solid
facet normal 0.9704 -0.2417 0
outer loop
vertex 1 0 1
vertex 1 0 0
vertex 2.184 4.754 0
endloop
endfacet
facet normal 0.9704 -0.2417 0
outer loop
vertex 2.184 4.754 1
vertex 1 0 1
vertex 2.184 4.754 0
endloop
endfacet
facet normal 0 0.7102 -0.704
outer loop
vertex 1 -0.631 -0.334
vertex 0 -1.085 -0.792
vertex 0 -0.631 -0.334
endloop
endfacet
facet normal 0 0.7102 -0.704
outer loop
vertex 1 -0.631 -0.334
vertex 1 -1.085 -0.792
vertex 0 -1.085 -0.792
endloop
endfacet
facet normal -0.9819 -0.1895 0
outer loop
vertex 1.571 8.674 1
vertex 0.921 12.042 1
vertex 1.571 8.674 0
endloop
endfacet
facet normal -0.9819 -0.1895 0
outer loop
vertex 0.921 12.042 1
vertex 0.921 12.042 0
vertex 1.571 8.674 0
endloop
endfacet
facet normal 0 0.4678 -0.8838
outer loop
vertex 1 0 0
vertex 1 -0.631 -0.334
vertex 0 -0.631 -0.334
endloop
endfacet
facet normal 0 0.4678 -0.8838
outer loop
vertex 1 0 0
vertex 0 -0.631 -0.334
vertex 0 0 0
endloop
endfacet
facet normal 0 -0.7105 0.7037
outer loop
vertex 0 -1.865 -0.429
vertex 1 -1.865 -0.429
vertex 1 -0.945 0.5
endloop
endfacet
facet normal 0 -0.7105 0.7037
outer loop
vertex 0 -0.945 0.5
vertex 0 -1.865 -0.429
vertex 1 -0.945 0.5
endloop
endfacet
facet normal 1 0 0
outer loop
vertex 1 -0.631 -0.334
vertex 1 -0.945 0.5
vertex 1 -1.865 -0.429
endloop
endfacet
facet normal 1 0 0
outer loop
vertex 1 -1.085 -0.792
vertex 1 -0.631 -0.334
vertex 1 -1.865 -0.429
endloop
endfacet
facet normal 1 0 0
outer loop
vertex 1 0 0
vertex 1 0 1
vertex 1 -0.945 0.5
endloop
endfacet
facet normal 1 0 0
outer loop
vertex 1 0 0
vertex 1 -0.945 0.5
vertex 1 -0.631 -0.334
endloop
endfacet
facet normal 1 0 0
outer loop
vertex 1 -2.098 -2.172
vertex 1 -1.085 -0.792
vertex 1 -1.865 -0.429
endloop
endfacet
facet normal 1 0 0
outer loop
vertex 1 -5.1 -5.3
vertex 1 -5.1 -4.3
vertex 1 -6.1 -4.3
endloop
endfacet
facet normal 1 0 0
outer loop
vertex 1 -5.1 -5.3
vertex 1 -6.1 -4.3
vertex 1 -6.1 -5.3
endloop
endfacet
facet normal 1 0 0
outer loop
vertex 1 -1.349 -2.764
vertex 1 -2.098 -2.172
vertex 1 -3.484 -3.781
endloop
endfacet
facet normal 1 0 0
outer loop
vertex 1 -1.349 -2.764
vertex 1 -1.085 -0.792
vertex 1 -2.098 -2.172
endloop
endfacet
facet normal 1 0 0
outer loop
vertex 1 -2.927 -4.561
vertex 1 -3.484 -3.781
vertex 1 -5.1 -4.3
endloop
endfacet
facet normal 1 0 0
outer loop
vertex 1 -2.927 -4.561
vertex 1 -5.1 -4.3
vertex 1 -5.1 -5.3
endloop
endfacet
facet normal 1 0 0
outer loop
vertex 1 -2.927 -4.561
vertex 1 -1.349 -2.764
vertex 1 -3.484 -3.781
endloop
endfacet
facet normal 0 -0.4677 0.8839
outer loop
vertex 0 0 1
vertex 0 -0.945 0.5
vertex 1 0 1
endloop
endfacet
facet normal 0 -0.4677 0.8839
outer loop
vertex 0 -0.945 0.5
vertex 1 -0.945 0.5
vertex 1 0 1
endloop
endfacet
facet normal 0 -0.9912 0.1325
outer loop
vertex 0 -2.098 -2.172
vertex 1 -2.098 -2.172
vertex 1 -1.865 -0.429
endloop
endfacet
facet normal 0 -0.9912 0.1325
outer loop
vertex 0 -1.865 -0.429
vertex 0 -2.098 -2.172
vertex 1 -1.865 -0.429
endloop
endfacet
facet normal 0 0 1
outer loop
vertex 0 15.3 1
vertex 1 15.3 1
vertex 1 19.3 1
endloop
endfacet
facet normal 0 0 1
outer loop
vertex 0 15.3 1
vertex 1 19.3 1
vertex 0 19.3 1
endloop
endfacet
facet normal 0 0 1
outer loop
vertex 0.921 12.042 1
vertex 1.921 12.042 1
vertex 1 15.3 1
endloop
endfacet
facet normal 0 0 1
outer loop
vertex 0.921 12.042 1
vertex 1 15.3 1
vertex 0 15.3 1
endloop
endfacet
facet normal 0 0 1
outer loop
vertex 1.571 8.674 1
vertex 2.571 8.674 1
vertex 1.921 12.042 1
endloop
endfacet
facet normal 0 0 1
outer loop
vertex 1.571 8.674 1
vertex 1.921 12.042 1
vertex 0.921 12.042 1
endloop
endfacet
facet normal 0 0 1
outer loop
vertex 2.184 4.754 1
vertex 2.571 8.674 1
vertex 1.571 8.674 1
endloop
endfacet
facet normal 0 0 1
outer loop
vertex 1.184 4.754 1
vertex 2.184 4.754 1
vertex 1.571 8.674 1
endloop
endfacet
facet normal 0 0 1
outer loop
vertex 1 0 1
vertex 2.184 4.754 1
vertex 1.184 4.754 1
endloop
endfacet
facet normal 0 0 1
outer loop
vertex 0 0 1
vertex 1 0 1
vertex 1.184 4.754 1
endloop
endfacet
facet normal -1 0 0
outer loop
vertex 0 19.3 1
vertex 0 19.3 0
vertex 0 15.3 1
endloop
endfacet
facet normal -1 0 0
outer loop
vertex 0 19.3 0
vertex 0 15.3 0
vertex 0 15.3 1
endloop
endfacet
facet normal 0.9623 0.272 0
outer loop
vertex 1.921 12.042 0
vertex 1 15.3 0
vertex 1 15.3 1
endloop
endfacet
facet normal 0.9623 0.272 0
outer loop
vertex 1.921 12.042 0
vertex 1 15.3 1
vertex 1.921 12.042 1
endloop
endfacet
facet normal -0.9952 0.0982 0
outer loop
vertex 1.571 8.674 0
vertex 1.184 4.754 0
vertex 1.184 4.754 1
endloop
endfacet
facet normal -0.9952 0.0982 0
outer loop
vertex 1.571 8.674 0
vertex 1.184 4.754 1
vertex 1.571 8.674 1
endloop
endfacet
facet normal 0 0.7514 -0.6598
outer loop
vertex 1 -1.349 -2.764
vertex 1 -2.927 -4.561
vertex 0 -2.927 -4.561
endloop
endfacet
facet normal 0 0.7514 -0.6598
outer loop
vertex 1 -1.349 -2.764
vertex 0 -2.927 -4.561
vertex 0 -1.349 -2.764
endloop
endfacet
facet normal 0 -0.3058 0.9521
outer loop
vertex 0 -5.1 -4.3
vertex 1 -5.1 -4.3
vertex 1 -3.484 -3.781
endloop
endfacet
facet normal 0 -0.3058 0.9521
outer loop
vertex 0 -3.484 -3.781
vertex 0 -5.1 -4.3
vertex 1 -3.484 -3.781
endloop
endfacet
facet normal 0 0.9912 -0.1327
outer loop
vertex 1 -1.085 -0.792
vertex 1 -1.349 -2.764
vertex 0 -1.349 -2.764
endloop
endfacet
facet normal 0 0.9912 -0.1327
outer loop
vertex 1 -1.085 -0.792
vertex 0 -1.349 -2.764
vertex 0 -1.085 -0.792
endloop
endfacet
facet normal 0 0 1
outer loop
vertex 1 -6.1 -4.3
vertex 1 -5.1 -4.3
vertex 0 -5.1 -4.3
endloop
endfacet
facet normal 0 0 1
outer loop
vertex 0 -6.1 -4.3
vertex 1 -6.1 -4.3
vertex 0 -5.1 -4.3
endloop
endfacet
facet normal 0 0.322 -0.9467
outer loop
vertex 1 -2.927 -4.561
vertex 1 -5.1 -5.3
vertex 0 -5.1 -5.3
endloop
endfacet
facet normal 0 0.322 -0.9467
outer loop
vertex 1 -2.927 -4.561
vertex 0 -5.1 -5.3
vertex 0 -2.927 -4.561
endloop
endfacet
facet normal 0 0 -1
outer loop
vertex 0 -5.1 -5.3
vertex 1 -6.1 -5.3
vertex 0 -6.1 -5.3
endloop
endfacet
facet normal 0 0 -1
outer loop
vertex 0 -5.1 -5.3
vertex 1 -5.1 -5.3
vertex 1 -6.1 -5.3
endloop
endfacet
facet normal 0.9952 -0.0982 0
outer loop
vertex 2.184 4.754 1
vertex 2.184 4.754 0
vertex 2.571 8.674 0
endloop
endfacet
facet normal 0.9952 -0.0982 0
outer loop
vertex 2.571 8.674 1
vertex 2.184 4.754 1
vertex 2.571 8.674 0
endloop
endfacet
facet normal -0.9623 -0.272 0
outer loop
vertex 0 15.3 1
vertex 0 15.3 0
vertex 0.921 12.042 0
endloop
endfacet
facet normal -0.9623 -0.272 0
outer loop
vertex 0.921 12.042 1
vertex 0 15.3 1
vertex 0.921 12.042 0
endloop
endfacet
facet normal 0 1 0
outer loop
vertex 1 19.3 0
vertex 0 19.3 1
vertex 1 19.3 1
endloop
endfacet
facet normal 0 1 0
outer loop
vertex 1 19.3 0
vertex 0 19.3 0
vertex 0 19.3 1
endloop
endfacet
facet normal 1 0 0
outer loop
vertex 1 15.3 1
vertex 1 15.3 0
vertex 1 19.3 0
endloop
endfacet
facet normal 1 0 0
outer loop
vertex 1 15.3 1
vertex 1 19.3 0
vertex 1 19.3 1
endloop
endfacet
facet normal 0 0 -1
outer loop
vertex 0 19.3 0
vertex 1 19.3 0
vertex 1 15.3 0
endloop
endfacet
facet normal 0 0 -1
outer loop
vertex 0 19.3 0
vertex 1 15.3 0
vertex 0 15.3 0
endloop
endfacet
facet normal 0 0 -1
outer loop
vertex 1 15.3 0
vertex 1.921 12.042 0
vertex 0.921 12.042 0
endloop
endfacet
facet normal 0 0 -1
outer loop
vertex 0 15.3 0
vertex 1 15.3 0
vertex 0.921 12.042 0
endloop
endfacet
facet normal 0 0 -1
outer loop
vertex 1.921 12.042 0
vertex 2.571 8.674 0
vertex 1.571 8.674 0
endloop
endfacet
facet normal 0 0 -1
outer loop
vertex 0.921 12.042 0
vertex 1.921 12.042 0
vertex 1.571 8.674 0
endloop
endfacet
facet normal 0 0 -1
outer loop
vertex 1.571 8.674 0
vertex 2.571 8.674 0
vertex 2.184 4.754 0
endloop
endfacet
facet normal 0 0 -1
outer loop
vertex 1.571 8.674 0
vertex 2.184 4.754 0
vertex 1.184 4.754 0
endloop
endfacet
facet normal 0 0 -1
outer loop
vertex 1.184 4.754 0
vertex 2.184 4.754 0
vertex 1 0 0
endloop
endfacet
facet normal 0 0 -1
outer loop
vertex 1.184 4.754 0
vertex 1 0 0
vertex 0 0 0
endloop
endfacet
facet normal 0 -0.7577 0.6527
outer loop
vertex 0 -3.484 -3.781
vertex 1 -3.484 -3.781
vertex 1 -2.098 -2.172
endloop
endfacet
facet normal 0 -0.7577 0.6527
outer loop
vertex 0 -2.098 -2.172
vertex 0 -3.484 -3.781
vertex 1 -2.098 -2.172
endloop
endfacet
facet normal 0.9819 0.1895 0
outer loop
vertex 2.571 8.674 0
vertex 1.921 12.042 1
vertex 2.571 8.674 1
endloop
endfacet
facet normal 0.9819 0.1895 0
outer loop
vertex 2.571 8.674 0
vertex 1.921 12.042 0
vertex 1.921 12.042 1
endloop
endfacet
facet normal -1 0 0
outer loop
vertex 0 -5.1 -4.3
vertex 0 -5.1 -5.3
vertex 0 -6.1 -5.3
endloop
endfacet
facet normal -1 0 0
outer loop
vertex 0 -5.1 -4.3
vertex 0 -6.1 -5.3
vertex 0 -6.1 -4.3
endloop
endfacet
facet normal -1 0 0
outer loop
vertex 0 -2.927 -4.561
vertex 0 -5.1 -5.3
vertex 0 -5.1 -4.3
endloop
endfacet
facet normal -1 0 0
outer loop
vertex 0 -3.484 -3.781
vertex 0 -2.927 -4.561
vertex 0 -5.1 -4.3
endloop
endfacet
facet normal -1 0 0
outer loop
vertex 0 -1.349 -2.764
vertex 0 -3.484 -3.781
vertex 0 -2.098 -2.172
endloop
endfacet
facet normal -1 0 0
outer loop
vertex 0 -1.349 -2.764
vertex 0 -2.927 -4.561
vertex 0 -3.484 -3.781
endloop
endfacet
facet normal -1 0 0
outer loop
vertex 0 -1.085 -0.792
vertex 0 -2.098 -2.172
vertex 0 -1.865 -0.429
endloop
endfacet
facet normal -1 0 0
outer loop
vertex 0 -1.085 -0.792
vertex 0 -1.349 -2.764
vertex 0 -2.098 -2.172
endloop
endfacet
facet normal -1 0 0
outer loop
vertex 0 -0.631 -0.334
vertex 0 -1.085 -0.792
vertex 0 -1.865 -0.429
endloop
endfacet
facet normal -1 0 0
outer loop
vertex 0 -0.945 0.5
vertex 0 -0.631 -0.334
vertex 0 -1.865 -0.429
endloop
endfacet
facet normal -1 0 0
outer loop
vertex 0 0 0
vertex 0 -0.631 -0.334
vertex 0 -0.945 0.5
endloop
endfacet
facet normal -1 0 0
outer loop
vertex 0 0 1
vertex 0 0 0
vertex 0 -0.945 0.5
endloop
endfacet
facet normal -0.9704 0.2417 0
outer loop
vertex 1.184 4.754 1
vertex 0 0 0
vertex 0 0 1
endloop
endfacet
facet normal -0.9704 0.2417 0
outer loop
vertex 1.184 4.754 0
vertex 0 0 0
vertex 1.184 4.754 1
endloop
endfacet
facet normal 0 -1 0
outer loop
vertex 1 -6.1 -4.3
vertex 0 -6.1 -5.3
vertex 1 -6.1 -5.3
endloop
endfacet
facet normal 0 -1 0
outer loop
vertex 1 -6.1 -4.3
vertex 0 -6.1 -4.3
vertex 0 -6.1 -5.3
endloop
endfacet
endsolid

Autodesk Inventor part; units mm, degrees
ref_plane "YZ Plane" through (0, 0, 0) normal (1, 0, 0) x (0, 1, 0)
ref_plane "XZ Plane" through (0, 0, 0) normal (0, 1, 0) x (-1, 0, 0)
ref_plane "XY Plane" through (0, 0, 0) normal (0, 0, 1) x (1, 0, 0)
sketch "Sketch1" plane through (0, 0, 0) normal (0, 0, 1) x (1, 0, 0)
  line L0 (0, 0) -> (1, 0)
  line L1 (0.5, 0) -> (0.5, 15.3)
  line L2 (0.5, 0) -> (15.8, 0) construction
  line L3 (0, 15.3) -> (1, 15.3)
  line L4 (1, 0) -> (2.1839, 4.7541)
  line L5 (2.1839, 4.7541) -> (2.5706, 8.6743)
  line L6 (1, 15.3) -> (1.9212, 12.0419)
  line L7 (1.9212, 12.0419) -> (2.5706, 8.6743)
  line L8 (0, 15.3) -> (0.9212, 12.0419)
  line L9 (0.9212, 12.0419) -> (1.5706, 8.6743)
  line L10 (1.1839, 4.7541) -> (1.5706, 8.6743)
  line L11 (0, 0) -> (1.1839, 4.7541)
  point P0 (0.5, 0)
  point P1 (0.5, 15.3)
  dimension "d0" = 1
  dimension "d1" = 15.3
  dimension "d2" = 90
  dimension "d4" = 0
  dimension "d5" = 1
  dimension "d6" = 0.5
extrude "Extrusion1" add sketch "Sketch1" along normal blind 1 contours L11 L1 L0 | L1 L11 L10 L9 L8 L3 L6 L7 L5 L4 L0 | L8 L3 L1
sketch "Sketch2" plane through (-0.71, 15.3, 0) normal (0, 1, 0) x (1, 0, 0)
  line L0 (1.71, 0) -> (0.71, 0) projected
  line L1 (1.71, -1) -> (0.71, -1) projected
  line L2 (1.71, 0) -> (1.71, -1) projected
  line L3 (0.71, 0) -> (0.71, -1) projected
extrude "Extrusion2" add sketch "Sketch2" along normal blind 4
sketch "Sketch4" plane through (1, 15.3, 0) normal (1, 0, 0) x (0, 0, -1)
  line L0 (-1, 4) -> (0, 4) projected
  line L1 (-1, -15.3) -> (0, -15.3)
  line L2 (4.3, -20.4) -> (3.7812, -18.7843)
  line L3 (3.7812, -18.7843) -> (2.1719, -17.398)
  line L4 (2.1719, -17.398) -> (0.4286, -17.1646)
  line L5 (0.4286, -17.1646) -> (-0.5, -16.2449)
  line L6 (-0.5, -16.2449) -> (-1, -15.3)
  line L7 (5.3, -20.4) -> (4.5609, -18.2271)
  line L8 (4.5609, -18.2271) -> (2.7638, -16.6488)
  line L9 (2.7638, -16.6488) -> (0.7923, -16.3849)
  line L10 (0.7923, -16.3849) -> (0.3338, -15.9308)
  line L11 (0.3338, -15.9308) -> (0, -15.3)
  line L12 (4.3, -20.4) -> (5.3, -20.4)
  line L13 (0, -15.3) -> (-1, -15.3) projected
  point P0 (0, 3)
  point P1 (0, -15.3)
  dimension "d13" = 1
  dimension "d22" = 5.1
  dimension "d23" = 5.1
  dimension "d24" = 5.3
  dimension "d25" = 5.3
  dimension "d28" = 0
  dimension "d29" = 0
extrude "Extrusion4" add sketch "Sketch4" against normal blind 1
sketch "Sketch6" plane through (1, -5.1, -5.3) normal (0, -1, 0) x (1, 0, 0)
  line L0 (0, 1) -> (0, 0) projected
  line L1 (0, 1) -> (-1, 1) projected
  line L2 (-1, 0) -> (-1, 1) projected
  line L3 (0, 0) -> (-1, 0) projected
  point P0 (-1, 5.3)
extrude "Extrusion6" add sketch "Sketch6" along normal blind 1
equation "\"d23\" = d22"
equation "\"d25\" = d24"
properties part number "jst-vh-2p_wire"
